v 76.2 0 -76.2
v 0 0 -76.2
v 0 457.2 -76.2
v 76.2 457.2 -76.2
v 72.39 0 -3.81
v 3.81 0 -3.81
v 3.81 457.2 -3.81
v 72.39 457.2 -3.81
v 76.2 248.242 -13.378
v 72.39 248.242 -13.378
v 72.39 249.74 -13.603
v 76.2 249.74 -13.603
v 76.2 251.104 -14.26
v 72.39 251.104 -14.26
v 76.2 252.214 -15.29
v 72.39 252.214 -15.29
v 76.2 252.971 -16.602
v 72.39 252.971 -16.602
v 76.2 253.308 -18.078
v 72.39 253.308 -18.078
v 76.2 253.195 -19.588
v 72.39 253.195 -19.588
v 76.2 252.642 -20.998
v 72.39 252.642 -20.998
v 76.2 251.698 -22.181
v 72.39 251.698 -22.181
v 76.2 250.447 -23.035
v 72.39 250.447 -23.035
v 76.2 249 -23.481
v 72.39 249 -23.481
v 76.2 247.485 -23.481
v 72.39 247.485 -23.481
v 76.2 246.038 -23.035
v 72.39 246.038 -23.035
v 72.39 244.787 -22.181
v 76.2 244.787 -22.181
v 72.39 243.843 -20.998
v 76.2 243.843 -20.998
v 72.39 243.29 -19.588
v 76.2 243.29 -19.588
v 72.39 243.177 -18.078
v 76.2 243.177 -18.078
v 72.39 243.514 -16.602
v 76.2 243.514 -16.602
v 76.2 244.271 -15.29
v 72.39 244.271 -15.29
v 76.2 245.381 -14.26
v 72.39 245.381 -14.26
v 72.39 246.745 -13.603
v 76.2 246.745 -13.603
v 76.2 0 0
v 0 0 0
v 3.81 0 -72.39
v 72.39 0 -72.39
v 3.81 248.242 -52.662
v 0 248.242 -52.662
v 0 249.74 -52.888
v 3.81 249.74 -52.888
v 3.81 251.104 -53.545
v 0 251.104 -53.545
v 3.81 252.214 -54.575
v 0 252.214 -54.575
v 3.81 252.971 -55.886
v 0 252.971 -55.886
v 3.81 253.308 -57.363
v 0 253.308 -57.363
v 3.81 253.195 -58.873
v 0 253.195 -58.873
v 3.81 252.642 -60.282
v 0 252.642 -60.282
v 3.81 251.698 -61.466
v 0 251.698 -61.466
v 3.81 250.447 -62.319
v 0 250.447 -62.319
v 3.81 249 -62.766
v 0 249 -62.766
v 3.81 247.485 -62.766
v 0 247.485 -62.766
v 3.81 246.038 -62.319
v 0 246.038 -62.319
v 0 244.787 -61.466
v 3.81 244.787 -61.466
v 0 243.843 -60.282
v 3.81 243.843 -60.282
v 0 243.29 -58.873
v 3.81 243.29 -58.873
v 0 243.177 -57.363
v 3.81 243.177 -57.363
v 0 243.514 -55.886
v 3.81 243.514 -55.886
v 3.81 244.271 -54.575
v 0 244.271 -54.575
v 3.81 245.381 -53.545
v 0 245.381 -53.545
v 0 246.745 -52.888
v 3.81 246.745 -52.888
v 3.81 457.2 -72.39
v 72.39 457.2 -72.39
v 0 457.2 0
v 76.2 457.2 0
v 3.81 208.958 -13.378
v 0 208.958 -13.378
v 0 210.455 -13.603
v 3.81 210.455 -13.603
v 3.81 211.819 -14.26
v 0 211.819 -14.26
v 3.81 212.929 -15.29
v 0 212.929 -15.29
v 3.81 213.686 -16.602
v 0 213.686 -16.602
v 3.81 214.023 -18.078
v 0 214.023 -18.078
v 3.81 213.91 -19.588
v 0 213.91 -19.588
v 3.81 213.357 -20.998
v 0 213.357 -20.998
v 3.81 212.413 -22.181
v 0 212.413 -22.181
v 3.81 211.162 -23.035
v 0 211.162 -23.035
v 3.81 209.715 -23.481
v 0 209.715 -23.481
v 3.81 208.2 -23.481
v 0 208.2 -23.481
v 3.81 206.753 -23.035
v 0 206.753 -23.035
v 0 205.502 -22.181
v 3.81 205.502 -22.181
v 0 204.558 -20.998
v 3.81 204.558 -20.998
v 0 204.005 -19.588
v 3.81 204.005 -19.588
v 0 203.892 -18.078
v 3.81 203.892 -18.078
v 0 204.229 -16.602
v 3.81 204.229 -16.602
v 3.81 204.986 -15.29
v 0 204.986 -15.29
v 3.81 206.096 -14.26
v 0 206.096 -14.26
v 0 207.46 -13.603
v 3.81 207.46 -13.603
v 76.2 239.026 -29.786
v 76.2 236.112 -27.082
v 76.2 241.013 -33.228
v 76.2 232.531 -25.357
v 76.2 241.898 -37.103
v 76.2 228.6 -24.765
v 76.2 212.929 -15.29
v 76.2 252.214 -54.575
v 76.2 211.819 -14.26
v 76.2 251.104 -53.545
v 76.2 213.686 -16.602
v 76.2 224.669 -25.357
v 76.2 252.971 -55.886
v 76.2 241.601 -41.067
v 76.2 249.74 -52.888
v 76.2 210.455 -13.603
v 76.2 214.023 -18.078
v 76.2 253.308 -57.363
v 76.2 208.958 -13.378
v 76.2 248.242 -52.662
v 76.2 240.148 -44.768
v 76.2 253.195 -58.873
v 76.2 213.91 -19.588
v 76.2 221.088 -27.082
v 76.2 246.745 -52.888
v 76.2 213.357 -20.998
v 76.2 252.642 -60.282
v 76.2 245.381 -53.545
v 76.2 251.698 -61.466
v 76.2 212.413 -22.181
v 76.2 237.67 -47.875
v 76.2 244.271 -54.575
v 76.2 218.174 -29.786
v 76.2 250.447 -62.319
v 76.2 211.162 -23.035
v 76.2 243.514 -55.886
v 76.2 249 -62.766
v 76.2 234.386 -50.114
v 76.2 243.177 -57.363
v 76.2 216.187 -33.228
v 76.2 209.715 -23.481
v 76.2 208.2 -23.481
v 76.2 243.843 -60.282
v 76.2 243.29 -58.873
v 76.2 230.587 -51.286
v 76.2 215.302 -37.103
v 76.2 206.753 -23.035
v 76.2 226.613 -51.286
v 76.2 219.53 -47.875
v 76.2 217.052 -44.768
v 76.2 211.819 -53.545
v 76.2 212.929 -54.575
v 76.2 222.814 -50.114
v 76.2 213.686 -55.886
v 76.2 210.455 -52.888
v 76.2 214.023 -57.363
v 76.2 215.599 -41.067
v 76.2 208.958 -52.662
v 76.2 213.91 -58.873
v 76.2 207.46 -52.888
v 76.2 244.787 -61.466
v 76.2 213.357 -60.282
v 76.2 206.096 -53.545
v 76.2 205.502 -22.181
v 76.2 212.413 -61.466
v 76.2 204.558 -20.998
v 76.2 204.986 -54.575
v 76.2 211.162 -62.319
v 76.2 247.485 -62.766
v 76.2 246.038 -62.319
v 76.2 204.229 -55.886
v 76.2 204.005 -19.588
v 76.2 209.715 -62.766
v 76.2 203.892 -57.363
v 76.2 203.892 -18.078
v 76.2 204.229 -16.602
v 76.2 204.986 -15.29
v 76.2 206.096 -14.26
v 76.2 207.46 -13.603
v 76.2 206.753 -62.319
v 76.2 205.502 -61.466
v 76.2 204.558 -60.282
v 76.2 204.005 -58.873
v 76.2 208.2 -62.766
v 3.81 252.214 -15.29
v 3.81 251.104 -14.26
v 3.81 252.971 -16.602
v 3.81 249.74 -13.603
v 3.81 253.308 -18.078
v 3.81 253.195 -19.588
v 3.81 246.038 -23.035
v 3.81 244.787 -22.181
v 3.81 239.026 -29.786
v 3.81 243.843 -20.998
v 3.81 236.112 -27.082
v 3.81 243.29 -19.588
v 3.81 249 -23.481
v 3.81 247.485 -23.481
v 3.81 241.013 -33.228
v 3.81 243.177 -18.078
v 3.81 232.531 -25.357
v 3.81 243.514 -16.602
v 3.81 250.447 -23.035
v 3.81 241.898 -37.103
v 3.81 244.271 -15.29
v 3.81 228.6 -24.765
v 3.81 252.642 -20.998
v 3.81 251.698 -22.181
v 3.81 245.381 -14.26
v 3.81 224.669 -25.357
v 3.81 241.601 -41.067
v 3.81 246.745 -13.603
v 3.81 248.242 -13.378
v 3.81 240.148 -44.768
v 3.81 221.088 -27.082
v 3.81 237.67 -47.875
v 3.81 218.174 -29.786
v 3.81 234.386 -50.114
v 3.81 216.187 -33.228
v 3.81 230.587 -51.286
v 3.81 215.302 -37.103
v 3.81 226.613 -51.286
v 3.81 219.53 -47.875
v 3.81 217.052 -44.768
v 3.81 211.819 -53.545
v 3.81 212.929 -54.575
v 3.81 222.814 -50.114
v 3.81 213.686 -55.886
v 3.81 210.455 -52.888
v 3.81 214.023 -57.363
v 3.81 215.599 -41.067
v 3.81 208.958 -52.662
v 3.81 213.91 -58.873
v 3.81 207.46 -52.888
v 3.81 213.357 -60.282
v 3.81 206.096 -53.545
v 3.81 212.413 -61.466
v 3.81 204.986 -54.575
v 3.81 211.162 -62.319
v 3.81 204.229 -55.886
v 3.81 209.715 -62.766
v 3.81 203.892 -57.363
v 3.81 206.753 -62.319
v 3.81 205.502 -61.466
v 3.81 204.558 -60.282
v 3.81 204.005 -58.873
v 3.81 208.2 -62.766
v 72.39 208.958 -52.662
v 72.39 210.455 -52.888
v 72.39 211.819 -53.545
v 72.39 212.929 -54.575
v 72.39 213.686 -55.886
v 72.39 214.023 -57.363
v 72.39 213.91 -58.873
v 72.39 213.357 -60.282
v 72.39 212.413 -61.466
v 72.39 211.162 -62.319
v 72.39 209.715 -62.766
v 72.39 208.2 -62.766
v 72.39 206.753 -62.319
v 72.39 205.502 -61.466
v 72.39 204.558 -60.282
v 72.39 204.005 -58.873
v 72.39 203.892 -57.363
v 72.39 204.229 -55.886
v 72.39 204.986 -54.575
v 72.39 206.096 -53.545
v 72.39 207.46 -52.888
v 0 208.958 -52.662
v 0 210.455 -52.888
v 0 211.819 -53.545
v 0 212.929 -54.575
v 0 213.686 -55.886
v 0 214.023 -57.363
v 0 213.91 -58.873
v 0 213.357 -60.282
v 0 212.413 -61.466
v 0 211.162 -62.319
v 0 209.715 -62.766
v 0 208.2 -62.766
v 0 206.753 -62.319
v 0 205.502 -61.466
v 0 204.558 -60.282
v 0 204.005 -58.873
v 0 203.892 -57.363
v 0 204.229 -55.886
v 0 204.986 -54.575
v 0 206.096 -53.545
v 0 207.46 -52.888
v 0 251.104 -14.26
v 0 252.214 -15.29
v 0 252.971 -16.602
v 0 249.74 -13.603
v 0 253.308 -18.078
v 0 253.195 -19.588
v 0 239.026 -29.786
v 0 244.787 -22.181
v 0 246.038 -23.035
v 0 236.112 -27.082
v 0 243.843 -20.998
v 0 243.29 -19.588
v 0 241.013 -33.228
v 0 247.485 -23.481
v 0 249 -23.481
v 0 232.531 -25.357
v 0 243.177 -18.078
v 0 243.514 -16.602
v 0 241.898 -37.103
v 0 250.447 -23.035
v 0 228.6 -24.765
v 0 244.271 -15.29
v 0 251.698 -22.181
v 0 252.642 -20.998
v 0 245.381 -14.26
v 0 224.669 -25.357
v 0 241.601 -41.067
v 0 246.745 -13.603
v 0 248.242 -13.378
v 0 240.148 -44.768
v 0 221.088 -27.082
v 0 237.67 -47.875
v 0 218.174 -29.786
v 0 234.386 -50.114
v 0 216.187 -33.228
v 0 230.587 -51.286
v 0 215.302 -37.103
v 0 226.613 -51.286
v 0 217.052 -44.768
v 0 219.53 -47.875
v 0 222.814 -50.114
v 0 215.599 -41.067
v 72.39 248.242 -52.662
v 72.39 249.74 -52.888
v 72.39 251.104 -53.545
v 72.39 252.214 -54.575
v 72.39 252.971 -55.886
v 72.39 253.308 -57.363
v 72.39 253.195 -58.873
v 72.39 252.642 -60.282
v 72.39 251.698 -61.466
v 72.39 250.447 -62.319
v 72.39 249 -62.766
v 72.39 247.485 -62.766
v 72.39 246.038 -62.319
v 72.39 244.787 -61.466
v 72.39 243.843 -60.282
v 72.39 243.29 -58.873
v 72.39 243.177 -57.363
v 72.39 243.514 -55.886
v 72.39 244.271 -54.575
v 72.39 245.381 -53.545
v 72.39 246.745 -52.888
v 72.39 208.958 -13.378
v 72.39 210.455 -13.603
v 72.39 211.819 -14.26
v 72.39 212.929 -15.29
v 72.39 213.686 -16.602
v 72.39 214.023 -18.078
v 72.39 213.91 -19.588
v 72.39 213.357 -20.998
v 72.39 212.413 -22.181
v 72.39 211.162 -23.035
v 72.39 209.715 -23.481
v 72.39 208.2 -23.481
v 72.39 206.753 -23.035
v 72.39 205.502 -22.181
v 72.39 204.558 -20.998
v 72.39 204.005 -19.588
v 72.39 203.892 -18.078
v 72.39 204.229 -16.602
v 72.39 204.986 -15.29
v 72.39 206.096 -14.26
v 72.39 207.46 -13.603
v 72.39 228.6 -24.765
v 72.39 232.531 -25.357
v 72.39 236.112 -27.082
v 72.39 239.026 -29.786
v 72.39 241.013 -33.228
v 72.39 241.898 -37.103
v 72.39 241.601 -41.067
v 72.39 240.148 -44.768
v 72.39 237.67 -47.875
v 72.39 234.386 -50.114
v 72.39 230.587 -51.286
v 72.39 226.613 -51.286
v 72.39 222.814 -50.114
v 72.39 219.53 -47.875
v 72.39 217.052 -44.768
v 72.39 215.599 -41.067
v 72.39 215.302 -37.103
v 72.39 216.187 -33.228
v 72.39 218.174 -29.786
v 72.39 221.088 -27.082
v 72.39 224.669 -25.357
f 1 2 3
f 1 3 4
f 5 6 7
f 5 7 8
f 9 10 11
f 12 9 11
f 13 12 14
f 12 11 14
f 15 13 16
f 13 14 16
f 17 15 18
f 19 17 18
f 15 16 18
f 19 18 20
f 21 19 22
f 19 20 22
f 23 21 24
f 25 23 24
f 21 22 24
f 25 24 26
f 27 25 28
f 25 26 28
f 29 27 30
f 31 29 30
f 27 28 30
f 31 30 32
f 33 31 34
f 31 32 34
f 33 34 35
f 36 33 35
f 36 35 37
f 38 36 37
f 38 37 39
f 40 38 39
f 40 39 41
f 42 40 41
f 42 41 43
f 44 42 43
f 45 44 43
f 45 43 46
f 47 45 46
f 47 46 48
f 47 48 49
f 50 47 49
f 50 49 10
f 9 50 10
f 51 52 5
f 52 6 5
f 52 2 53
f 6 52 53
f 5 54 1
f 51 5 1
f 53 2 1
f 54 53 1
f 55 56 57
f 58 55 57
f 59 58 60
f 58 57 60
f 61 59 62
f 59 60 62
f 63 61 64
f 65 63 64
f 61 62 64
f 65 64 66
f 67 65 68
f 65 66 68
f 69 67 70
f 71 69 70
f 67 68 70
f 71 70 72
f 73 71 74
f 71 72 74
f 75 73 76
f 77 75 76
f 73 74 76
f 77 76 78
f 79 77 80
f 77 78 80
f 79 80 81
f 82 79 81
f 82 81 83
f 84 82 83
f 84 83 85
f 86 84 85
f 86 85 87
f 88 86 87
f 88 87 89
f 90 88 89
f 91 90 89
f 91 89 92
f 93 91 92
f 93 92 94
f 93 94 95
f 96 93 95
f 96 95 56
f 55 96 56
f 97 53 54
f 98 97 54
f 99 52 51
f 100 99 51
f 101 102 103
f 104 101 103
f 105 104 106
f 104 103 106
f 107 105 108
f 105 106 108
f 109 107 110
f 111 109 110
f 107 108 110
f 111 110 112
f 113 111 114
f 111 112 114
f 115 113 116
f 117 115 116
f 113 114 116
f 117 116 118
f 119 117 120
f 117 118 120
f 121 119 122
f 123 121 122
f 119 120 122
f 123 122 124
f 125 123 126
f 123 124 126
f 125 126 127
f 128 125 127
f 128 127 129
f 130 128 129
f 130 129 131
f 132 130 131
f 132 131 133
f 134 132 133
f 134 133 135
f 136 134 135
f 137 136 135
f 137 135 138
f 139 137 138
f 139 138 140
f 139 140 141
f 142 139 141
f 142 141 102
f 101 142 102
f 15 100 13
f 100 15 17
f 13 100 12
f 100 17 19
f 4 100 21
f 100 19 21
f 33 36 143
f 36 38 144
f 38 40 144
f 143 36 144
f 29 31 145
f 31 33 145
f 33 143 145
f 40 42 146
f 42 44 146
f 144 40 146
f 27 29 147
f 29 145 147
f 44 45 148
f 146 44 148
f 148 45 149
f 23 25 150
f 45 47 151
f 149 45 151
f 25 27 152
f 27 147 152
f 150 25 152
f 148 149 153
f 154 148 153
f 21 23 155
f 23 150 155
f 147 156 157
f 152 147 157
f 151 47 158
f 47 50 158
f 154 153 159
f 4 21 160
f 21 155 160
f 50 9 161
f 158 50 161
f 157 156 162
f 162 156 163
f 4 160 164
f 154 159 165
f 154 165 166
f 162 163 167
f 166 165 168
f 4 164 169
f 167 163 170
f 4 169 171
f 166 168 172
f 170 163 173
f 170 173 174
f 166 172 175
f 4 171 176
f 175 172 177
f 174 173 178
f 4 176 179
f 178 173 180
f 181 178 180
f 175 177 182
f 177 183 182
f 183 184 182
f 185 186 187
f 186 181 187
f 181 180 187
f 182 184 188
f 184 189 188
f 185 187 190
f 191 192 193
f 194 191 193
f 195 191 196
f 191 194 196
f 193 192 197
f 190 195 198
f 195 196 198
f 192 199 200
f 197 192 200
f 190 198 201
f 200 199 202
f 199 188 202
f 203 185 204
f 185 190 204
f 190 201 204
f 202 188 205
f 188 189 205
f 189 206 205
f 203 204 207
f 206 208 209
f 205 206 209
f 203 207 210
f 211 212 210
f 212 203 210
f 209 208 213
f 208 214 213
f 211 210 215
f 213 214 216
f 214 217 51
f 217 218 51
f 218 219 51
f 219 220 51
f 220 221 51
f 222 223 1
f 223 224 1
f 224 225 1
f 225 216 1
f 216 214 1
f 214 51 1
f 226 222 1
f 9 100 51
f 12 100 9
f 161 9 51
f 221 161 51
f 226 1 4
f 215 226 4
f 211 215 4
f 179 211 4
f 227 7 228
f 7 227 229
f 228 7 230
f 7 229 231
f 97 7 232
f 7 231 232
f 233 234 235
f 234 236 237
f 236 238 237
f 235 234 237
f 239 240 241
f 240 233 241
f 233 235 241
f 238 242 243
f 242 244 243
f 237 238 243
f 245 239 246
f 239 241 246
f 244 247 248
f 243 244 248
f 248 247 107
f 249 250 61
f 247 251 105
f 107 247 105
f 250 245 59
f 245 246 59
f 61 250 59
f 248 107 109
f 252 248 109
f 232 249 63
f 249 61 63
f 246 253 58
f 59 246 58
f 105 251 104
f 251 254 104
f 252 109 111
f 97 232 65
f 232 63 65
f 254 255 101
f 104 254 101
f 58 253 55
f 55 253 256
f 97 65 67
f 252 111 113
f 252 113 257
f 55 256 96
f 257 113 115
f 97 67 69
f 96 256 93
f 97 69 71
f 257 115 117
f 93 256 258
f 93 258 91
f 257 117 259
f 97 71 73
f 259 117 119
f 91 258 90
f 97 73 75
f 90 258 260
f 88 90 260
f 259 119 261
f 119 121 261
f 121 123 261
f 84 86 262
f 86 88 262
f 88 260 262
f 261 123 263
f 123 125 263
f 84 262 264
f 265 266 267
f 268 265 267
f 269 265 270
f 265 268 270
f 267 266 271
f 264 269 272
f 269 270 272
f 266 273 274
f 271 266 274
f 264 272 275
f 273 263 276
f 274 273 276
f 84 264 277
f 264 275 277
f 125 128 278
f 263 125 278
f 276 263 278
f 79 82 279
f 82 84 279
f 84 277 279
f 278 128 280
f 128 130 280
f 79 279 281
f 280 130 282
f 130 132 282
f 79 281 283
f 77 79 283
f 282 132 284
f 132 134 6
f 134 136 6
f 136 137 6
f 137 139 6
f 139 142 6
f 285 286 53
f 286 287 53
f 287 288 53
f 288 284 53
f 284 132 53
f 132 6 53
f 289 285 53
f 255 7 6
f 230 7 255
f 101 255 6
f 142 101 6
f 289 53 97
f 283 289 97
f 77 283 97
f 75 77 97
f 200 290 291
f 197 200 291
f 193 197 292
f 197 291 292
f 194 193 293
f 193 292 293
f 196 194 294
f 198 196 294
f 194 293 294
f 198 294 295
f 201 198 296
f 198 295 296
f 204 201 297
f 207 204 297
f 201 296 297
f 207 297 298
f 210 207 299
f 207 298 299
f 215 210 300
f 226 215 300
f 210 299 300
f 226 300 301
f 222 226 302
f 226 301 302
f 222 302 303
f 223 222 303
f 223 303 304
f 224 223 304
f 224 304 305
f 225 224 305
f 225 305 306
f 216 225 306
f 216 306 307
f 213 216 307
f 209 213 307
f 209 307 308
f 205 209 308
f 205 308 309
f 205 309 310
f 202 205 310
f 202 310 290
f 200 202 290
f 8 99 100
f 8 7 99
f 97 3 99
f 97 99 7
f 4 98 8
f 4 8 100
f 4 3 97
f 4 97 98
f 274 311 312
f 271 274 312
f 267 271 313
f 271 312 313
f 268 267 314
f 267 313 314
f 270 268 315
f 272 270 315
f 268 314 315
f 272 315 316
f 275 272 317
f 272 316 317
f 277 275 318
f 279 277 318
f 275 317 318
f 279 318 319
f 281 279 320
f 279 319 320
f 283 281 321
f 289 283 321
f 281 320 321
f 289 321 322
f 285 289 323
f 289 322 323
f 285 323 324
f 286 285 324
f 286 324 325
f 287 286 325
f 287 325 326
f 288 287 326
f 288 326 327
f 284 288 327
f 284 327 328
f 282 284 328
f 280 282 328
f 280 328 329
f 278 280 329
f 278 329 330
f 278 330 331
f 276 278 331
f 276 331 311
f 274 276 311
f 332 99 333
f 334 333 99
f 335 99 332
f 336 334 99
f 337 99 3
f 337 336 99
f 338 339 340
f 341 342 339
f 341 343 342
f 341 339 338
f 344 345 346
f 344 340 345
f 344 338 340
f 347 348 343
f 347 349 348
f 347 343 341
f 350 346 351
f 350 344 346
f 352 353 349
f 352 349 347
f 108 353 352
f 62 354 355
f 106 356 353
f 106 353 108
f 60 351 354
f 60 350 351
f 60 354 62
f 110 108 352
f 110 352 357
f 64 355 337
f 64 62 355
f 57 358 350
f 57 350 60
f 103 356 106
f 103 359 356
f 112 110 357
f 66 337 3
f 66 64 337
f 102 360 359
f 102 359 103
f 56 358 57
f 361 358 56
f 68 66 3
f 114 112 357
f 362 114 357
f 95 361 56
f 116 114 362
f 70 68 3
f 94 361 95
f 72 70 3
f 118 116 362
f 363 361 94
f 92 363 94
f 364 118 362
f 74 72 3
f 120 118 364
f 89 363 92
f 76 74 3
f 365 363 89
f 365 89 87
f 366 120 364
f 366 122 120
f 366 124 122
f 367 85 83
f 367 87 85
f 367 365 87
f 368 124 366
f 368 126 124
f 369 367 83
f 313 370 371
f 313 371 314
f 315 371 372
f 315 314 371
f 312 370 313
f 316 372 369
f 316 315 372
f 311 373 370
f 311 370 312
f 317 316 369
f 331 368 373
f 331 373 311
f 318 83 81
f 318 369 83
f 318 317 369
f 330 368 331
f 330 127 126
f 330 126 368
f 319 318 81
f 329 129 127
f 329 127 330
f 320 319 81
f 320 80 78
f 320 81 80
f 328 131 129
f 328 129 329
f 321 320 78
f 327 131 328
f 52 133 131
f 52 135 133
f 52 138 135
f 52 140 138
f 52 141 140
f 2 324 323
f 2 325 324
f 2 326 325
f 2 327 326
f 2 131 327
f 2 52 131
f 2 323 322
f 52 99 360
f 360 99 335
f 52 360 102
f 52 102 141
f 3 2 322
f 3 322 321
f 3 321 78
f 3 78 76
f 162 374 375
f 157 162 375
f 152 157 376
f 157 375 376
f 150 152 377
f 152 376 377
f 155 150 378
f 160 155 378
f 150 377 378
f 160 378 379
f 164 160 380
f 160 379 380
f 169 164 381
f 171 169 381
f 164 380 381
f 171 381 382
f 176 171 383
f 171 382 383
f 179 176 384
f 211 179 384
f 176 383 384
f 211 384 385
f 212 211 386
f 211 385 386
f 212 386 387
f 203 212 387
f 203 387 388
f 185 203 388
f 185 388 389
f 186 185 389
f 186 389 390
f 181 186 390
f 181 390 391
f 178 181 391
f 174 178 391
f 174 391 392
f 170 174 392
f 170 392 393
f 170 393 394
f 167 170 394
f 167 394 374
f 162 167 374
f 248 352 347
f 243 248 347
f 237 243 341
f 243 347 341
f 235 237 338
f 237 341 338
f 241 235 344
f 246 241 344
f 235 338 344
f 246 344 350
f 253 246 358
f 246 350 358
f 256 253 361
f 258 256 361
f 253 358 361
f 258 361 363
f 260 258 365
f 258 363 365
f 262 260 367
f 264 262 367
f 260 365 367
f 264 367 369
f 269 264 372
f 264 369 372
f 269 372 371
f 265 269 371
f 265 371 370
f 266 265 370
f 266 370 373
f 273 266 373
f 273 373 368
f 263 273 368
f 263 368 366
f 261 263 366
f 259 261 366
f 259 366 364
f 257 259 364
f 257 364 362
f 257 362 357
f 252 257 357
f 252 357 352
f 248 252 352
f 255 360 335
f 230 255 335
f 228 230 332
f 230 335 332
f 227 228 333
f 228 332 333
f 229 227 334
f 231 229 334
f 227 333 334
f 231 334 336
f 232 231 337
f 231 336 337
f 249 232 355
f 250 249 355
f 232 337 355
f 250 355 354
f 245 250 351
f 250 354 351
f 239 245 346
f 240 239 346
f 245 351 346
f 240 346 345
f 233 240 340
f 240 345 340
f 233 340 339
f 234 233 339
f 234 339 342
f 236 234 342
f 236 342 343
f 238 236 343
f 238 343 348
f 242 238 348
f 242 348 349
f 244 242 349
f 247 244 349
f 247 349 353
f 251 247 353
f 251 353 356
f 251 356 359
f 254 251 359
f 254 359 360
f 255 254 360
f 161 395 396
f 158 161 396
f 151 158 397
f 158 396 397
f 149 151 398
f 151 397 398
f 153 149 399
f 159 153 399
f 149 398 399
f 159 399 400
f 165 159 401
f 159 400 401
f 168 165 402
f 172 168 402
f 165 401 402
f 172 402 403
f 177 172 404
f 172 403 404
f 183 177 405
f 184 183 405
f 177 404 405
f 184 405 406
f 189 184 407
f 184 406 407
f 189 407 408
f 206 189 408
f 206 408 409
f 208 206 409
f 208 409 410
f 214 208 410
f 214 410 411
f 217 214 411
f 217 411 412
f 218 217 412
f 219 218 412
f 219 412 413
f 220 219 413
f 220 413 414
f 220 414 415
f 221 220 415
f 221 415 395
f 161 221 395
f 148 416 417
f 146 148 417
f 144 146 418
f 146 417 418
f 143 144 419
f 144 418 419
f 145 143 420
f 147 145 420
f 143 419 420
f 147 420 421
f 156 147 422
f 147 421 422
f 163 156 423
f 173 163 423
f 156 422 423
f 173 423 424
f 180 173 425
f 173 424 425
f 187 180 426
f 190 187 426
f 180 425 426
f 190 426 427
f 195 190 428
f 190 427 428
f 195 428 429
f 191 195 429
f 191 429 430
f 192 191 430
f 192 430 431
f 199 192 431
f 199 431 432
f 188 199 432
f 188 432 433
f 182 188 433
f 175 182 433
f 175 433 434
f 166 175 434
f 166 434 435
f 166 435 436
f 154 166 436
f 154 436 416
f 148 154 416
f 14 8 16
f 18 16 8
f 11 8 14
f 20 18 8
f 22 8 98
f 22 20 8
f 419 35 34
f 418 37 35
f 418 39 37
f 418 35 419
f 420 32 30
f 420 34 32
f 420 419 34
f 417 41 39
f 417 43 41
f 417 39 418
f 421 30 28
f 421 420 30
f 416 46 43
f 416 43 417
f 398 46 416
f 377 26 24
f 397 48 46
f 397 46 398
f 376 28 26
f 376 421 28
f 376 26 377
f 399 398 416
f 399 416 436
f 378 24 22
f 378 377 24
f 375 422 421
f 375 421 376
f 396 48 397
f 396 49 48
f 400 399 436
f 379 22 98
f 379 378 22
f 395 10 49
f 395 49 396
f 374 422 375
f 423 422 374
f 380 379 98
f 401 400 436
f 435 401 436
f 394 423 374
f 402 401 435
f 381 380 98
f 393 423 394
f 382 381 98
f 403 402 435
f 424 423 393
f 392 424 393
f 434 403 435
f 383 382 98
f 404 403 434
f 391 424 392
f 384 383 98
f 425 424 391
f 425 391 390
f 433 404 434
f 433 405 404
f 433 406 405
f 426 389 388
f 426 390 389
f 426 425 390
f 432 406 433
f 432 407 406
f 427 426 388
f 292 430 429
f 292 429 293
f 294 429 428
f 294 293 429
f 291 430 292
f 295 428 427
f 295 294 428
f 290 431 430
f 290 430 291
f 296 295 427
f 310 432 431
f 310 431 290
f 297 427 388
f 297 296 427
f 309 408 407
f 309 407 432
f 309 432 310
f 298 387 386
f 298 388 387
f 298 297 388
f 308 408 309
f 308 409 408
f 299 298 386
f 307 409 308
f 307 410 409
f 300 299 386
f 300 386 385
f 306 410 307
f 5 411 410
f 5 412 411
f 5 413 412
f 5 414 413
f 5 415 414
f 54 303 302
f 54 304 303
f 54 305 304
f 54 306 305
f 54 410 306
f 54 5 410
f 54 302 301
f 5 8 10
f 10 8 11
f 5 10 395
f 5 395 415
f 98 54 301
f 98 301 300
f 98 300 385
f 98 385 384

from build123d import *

# Parameters (mm, degrees)
SKETCH1_W           = 76.2
SKETCH1_H           = 76.2
SKETCH1_W_2         = 68.58
SKETCH1_H_2         = 68.58
BOSS_EXTRUDE1_DEPTH = 457.2
SKETCH2_R           = 13.335
CUT_EXTRUDE1_DEPTH  = 914.4
SKETCH3_R           = 5.08
CUT_EXTRUDE2_DEPTH  = 914.4


with BuildPart() as part:
    # Sketch1 → Boss-Extrude1 (new body)
    with BuildSketch(Plane(origin=(0, 0, 0), x_dir=(1, 0, 0), z_dir=(0, 1, 0))):
        with Locations((38.1, 38.1)):
            Rectangle(SKETCH1_W, SKETCH1_H)
        with Locations((38.1, 38.1)):
            Rectangle(SKETCH1_W_2, SKETCH1_H_2, mode=Mode.SUBTRACT)
    extrude(amount=BOSS_EXTRUDE1_DEPTH)

    # Sketch2 → Cut-Extrude1 (cut)
    with BuildSketch(Plane.ZY):
        with Locations((-38.1, 228.6)):
            Circle(SKETCH2_R)
    extrude(amount=-CUT_EXTRUDE1_DEPTH, mode=Mode.SUBTRACT)

    # Sketch3 → Cut-Extrude2 (cut)
    with BuildSketch(Plane.ZY):
        with Locations((-57.742411839, 248.242411839)):
            Circle(SKETCH3_R)
        with Locations((-18.457588161, 248.242411839)):
            Circle(SKETCH3_R)
        with Locations((-57.742411839, 208.957588161)):
            Circle(SKETCH3_R)
        with Locations((-18.457588161, 208.957588161)):
            Circle(SKETCH3_R)
    extrude(amount=-CUT_EXTRUDE2_DEPTH, mode=Mode.SUBTRACT)


solid = part.part
